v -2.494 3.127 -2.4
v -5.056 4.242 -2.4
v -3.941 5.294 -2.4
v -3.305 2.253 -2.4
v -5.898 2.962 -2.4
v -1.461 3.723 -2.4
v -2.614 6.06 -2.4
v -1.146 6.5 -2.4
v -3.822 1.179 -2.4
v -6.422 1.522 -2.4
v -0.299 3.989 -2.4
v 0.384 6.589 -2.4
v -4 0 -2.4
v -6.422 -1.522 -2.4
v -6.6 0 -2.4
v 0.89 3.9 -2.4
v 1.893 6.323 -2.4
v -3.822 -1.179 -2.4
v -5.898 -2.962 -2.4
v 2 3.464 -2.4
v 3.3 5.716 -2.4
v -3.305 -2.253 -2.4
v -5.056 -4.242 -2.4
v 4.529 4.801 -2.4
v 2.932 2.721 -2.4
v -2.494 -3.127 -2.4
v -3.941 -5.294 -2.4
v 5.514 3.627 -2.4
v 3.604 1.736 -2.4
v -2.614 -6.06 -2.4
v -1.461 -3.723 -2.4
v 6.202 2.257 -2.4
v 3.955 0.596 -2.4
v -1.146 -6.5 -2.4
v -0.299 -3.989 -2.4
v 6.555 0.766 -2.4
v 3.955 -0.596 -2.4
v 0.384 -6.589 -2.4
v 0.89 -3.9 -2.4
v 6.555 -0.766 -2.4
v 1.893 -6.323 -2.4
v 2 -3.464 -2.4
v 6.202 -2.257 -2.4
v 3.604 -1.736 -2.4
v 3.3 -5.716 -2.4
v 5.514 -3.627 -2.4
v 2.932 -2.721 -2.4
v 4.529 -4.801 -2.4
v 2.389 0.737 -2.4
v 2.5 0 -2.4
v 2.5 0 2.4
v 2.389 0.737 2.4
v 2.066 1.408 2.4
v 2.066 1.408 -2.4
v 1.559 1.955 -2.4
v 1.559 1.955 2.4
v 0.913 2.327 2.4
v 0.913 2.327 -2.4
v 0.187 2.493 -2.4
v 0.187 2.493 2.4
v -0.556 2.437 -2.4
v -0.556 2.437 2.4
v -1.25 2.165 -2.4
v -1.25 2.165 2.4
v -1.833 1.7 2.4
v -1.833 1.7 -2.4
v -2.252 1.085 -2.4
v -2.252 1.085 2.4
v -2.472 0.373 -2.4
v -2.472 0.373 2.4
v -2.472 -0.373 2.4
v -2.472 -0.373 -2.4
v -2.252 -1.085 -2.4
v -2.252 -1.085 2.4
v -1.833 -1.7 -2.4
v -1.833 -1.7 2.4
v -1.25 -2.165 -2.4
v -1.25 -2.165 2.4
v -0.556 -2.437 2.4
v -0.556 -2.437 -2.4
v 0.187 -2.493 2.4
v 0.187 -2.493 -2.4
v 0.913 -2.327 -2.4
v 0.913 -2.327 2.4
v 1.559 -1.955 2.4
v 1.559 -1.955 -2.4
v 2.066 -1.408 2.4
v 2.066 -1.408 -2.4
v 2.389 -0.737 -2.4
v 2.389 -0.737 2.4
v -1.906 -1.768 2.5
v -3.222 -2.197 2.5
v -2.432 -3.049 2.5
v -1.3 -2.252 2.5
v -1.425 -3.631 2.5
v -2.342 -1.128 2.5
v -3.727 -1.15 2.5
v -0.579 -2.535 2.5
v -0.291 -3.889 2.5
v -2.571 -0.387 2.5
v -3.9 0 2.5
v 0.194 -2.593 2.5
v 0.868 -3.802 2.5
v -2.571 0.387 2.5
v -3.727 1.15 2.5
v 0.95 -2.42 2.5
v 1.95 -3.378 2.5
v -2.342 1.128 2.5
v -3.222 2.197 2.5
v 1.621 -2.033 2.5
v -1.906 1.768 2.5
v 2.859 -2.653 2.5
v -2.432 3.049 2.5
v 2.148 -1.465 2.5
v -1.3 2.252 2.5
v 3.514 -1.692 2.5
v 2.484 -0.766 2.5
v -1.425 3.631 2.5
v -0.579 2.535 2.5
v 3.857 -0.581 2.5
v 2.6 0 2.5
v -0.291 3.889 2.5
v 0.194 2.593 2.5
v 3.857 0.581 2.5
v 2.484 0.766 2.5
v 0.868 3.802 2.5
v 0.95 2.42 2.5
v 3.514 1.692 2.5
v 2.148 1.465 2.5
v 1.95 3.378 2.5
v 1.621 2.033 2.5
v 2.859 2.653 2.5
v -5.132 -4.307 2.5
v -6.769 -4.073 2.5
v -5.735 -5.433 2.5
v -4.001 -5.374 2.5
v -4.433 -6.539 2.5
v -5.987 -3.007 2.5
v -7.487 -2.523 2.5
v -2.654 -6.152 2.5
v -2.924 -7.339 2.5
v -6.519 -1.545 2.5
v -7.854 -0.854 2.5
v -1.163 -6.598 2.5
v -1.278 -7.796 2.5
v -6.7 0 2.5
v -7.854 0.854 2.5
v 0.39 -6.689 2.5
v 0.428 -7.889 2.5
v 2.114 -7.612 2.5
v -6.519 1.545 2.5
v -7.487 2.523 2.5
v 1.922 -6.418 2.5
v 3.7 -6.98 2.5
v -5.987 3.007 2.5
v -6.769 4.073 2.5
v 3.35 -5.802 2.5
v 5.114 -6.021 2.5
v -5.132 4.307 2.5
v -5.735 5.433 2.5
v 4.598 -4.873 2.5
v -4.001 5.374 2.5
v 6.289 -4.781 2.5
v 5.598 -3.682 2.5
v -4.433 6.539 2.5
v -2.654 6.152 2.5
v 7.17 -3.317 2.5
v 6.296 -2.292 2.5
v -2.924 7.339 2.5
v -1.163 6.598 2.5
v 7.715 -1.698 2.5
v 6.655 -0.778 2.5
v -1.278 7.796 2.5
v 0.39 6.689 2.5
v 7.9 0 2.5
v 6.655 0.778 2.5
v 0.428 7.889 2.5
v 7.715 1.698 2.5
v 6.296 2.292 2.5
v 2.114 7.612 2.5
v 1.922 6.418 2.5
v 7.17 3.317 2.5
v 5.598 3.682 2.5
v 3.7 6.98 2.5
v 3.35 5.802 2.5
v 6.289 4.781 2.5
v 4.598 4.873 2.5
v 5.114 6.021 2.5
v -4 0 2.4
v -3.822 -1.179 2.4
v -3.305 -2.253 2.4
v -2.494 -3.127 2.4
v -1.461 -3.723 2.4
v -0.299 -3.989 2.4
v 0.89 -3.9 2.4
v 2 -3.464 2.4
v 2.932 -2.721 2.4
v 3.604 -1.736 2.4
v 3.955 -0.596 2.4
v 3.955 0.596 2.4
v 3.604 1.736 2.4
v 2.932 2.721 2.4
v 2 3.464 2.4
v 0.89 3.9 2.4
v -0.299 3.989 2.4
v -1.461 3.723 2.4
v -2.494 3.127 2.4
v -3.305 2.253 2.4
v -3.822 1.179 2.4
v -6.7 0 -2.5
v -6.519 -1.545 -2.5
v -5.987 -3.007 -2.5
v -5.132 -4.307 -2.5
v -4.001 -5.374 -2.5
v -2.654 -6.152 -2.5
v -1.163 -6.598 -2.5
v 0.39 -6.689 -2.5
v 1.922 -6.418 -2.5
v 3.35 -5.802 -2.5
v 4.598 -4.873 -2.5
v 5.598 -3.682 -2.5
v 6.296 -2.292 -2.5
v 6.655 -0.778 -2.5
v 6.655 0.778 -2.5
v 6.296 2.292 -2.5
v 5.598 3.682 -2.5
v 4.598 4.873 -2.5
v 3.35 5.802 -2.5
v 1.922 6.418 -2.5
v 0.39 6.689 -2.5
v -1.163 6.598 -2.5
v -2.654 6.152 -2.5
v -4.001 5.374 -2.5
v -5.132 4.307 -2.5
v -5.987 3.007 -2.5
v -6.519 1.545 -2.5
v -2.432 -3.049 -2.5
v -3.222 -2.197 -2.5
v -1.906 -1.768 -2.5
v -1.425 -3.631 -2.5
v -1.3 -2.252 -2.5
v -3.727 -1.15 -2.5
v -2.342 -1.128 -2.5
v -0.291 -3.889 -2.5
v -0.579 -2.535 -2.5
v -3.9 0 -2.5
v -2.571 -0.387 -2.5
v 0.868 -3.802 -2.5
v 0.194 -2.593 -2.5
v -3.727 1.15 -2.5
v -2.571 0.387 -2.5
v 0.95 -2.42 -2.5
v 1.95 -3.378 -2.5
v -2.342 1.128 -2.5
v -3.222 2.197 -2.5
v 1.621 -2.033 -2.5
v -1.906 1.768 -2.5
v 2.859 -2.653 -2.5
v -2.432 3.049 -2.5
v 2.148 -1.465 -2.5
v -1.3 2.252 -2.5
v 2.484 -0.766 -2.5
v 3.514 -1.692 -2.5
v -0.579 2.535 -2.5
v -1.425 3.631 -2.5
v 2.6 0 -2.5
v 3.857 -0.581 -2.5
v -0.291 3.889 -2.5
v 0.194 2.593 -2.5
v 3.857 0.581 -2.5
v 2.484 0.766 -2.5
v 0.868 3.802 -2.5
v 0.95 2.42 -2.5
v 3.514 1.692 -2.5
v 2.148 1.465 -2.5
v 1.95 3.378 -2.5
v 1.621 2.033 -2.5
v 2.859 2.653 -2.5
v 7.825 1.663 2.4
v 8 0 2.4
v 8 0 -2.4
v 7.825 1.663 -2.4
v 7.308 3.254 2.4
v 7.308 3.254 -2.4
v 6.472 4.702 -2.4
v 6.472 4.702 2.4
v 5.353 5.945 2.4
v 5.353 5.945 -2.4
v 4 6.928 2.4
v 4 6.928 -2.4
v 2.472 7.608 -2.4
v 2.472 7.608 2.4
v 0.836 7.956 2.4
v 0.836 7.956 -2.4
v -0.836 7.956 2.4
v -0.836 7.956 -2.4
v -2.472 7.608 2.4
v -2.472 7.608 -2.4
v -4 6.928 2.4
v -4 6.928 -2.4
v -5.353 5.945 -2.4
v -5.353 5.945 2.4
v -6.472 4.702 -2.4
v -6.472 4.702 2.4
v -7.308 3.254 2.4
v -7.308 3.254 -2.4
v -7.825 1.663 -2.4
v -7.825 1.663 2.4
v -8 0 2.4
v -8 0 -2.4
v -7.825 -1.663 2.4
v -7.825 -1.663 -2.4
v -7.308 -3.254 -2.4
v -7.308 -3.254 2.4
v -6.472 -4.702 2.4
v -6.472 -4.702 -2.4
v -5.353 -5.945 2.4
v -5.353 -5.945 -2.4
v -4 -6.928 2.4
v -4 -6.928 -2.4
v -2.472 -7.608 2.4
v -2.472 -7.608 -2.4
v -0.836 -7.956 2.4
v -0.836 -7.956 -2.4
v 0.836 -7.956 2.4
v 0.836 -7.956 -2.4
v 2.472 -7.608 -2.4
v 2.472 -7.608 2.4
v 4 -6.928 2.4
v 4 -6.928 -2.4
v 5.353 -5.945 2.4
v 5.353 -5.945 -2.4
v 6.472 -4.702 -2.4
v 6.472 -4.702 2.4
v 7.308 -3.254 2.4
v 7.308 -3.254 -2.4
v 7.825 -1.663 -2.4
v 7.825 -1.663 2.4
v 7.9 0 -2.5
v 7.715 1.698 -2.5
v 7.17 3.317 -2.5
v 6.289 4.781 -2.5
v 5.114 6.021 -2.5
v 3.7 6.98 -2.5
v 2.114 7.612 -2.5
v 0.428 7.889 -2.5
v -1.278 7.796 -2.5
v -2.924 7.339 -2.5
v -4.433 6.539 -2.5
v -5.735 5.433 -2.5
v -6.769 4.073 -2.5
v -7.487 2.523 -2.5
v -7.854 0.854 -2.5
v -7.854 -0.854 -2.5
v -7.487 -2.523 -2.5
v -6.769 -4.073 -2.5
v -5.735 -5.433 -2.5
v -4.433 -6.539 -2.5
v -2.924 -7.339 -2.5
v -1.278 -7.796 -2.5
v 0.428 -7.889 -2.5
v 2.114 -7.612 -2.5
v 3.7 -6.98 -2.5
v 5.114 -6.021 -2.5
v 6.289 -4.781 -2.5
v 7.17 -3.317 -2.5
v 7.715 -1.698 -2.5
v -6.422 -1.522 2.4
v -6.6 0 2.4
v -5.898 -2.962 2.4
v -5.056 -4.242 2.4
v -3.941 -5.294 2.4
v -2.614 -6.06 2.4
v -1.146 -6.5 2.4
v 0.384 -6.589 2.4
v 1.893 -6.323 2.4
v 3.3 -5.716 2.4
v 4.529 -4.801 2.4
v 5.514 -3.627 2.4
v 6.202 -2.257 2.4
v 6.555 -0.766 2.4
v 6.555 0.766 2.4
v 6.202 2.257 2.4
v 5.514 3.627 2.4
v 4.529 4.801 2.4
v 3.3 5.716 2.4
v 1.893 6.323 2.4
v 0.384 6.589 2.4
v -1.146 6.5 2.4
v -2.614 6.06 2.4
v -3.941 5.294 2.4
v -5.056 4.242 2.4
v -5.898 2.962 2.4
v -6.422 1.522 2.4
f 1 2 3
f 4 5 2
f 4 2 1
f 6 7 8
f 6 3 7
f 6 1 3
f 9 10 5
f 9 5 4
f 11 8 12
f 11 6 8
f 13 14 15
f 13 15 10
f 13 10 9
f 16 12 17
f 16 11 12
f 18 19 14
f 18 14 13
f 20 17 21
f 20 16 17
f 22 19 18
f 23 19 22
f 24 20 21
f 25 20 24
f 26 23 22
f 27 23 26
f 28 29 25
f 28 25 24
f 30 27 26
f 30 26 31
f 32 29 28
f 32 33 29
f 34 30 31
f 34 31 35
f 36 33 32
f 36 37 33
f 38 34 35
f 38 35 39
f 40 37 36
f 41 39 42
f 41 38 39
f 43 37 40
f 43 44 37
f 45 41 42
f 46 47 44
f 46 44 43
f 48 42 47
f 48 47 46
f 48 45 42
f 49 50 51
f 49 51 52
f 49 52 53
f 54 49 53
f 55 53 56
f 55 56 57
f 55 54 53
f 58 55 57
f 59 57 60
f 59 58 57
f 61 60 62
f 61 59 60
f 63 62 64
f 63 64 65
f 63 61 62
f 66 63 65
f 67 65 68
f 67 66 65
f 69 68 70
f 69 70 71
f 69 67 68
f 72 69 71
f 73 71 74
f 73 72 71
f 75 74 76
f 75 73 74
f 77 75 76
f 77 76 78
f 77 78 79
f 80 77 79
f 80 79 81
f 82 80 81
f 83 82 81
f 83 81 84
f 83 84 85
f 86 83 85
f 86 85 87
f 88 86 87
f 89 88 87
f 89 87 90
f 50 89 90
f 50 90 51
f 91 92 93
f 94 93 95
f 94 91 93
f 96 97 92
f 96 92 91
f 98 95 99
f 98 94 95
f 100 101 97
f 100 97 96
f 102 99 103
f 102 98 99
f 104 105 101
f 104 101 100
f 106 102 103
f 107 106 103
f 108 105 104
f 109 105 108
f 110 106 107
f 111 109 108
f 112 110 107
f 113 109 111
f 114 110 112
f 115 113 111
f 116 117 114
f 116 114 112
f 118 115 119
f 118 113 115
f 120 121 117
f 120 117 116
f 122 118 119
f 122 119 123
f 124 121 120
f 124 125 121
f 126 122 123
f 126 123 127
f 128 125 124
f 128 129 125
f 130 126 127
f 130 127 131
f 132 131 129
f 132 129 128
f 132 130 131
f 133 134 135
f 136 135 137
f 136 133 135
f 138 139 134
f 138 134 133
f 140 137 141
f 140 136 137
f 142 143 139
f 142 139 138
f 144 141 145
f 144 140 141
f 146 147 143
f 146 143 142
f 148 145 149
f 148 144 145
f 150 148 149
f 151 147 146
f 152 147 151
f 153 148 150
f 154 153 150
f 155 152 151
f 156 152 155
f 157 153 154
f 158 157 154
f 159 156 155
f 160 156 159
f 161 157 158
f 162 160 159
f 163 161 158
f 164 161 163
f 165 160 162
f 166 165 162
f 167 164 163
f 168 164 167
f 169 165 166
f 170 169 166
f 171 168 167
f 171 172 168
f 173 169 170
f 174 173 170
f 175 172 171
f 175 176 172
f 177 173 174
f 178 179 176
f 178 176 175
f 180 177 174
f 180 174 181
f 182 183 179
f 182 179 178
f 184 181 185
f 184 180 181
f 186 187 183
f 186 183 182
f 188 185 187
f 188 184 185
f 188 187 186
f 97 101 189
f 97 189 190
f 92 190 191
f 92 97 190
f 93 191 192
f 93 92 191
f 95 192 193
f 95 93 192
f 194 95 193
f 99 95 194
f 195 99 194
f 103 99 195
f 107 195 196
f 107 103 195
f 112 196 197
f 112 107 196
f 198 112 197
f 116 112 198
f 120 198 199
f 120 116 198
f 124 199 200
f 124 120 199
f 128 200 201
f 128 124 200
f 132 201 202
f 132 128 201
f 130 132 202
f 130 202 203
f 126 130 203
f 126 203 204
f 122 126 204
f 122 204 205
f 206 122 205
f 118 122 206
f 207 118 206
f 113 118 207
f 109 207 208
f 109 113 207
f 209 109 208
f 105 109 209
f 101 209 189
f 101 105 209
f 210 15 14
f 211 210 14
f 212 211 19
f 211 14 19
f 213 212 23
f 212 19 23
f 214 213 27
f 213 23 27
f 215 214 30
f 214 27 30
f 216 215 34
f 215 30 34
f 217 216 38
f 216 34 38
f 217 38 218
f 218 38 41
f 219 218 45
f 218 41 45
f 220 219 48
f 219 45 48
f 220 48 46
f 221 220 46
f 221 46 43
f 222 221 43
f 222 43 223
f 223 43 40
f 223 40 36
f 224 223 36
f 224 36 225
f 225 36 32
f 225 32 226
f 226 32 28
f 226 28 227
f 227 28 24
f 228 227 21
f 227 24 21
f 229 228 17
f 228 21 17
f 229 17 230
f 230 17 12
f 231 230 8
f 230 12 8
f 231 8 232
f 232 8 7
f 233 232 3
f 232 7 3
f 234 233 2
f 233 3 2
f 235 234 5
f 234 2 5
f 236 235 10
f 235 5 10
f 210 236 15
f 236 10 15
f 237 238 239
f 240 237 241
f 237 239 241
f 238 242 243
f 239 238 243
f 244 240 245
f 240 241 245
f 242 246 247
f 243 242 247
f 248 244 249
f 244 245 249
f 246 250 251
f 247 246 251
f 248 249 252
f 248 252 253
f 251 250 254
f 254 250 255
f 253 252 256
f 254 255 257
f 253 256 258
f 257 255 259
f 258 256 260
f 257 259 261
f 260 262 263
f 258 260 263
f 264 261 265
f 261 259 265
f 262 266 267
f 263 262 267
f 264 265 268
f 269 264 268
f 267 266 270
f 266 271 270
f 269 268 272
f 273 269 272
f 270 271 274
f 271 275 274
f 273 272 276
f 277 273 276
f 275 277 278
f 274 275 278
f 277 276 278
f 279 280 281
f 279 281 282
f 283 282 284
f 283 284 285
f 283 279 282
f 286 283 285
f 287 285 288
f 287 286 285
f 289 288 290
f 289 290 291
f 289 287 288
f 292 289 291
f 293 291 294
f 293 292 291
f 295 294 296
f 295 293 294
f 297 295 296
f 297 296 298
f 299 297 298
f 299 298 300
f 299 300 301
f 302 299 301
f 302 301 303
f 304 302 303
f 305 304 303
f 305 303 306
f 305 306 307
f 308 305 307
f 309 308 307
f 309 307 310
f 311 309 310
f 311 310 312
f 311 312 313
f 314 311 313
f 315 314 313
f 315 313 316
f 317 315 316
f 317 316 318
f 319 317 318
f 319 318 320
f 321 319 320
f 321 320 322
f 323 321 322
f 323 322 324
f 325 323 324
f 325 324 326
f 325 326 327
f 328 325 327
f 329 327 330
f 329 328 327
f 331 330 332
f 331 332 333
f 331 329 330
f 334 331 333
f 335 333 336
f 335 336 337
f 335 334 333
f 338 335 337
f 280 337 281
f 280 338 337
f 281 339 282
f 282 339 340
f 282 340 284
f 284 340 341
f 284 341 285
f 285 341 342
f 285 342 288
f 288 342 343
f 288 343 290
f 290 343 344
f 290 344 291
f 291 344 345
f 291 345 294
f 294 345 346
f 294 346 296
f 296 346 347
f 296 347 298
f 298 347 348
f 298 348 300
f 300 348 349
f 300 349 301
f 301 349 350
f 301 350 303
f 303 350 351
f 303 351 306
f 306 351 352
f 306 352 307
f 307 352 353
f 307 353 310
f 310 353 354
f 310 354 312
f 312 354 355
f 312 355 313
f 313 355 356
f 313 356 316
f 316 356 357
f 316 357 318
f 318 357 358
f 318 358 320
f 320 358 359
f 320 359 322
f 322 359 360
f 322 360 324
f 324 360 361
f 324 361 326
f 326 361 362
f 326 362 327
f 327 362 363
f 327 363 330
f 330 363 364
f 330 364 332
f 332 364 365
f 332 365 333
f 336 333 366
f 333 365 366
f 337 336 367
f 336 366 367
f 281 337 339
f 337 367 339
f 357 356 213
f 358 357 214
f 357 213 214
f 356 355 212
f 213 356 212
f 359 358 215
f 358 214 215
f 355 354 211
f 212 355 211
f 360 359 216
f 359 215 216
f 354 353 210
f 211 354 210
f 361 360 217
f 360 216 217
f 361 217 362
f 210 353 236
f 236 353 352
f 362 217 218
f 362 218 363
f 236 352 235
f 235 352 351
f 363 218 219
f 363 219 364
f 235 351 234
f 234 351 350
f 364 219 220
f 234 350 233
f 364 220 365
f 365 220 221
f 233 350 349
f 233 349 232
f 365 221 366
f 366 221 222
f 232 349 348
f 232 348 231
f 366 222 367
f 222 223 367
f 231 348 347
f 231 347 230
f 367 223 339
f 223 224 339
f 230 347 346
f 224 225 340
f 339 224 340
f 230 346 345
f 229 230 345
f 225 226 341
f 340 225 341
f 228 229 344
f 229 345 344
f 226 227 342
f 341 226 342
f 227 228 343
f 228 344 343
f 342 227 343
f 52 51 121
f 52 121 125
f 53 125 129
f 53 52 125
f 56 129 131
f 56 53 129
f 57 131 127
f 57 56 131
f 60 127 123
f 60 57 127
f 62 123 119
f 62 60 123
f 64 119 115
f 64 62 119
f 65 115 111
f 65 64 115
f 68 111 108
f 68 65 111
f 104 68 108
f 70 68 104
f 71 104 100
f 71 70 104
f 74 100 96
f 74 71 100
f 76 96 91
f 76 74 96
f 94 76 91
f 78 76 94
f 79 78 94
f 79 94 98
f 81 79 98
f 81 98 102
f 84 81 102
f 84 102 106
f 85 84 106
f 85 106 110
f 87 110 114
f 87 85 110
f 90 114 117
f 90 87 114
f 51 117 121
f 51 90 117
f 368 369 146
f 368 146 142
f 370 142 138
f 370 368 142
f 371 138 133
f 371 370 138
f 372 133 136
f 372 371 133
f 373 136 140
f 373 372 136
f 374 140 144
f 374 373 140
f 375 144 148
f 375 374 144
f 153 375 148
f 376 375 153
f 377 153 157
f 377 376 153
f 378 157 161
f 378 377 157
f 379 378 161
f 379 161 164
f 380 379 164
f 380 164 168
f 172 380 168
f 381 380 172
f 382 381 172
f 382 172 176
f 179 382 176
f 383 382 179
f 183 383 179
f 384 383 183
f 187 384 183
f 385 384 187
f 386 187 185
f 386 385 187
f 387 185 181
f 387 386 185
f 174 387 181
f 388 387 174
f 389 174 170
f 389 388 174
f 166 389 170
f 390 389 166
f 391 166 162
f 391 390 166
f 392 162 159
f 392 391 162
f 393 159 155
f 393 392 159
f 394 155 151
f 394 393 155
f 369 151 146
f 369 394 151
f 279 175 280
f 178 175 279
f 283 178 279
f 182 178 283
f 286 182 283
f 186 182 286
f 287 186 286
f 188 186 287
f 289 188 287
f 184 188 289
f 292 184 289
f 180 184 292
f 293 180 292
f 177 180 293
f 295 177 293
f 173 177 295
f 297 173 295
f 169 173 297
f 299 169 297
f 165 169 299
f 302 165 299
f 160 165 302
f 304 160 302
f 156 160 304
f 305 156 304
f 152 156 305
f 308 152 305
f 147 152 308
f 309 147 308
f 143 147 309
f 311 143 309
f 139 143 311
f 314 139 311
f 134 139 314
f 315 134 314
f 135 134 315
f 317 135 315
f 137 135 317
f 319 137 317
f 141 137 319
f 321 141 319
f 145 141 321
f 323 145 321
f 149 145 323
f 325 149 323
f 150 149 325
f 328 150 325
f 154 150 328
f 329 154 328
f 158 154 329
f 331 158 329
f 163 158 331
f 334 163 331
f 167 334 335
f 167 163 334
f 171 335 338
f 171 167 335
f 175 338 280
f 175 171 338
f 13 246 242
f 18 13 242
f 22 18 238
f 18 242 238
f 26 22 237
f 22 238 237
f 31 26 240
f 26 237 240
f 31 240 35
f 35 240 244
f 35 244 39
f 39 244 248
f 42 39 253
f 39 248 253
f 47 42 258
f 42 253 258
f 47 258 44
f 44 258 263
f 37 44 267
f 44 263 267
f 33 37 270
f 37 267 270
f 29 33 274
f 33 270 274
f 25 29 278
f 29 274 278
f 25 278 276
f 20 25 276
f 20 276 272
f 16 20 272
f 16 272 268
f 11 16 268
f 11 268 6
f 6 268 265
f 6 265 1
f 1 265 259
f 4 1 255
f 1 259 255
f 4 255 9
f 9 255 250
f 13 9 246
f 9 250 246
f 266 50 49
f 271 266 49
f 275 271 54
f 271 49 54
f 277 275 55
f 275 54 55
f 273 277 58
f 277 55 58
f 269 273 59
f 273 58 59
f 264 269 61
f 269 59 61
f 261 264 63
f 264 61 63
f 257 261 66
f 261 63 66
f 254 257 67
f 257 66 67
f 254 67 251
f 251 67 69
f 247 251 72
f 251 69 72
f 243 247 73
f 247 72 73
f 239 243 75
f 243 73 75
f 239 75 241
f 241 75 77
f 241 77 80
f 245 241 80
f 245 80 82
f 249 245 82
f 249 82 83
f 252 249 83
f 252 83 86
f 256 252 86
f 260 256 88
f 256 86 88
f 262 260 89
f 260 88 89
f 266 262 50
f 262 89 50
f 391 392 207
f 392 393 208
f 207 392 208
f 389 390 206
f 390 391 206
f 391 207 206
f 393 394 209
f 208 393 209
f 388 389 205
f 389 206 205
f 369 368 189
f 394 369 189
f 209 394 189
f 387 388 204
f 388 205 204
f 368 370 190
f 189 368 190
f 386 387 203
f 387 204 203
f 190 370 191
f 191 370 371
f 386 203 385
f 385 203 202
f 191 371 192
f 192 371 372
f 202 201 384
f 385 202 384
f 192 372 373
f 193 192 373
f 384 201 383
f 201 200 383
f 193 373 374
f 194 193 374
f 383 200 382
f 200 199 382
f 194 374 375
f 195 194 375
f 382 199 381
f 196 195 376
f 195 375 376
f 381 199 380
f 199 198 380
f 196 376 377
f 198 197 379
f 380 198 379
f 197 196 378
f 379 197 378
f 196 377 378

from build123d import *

# Parameters (mm, degrees)
SKIZZE1_R                       = 8
SKIZZE1_R_2                     = 2.5
AUFSATZ_LINEAR_AUSTRAGEN1_DEPTH = 2.5
SKETCH1_W                       = 2.6
SKETCH1_H                       = 0.1
CHAMFER1_SIZE                   = 0.1


with BuildPart() as part:
    # Skizze1 → Aufsatz-Linear austragen1 (new, symmetric)
    with BuildSketch(Plane.XY):
        Circle(SKIZZE1_R)
        Circle(SKIZZE1_R_2, mode=Mode.SUBTRACT)
    extrude(amount=AUFSATZ_LINEAR_AUSTRAGEN1_DEPTH, both=True)

    # Sketch1 → Cut-Revolve1 (revolve, cut)
    with BuildSketch(Plane(origin=(0, 0, 0), x_dir=(1, 0, 0), z_dir=(0, 1, 0)), mode=Mode.PRIVATE) as cut_revolve1_sk:
        with Locations((5.3, 2.45)):
            Rectangle(SKETCH1_W, SKETCH1_H)
        with Locations((5.3, -2.45)):
            Rectangle(SKETCH1_W, SKETCH1_H)
    revolve(cut_revolve1_sk.sketch.rotate(Axis((0, 0, -2.5), (0, 0, 1)), 180), axis=Axis((0, 0, -2.5), (0, 0, 1)), mode=Mode.SUBTRACT)

    # Chamfer1
    chamfer1_edges = [part.edges().sort_by_distance(p)[0] for p in [
        (6.6, 0, -2.5),
        (4, 0, -2.5),
        (4, 0, 2.5),
        (6.6, 0, 2.5),
        (-8, 0, -2.5),
        (-8, 0, 2.5),
        (-2.5, 0, -2.5),
        (-2.5, 0, 2.5),
    ]]
    chamfer(chamfer1_edges, length=CHAMFER1_SIZE - 0.0001)  # a hair under: the kernel refuses the full size


solid = part.part
